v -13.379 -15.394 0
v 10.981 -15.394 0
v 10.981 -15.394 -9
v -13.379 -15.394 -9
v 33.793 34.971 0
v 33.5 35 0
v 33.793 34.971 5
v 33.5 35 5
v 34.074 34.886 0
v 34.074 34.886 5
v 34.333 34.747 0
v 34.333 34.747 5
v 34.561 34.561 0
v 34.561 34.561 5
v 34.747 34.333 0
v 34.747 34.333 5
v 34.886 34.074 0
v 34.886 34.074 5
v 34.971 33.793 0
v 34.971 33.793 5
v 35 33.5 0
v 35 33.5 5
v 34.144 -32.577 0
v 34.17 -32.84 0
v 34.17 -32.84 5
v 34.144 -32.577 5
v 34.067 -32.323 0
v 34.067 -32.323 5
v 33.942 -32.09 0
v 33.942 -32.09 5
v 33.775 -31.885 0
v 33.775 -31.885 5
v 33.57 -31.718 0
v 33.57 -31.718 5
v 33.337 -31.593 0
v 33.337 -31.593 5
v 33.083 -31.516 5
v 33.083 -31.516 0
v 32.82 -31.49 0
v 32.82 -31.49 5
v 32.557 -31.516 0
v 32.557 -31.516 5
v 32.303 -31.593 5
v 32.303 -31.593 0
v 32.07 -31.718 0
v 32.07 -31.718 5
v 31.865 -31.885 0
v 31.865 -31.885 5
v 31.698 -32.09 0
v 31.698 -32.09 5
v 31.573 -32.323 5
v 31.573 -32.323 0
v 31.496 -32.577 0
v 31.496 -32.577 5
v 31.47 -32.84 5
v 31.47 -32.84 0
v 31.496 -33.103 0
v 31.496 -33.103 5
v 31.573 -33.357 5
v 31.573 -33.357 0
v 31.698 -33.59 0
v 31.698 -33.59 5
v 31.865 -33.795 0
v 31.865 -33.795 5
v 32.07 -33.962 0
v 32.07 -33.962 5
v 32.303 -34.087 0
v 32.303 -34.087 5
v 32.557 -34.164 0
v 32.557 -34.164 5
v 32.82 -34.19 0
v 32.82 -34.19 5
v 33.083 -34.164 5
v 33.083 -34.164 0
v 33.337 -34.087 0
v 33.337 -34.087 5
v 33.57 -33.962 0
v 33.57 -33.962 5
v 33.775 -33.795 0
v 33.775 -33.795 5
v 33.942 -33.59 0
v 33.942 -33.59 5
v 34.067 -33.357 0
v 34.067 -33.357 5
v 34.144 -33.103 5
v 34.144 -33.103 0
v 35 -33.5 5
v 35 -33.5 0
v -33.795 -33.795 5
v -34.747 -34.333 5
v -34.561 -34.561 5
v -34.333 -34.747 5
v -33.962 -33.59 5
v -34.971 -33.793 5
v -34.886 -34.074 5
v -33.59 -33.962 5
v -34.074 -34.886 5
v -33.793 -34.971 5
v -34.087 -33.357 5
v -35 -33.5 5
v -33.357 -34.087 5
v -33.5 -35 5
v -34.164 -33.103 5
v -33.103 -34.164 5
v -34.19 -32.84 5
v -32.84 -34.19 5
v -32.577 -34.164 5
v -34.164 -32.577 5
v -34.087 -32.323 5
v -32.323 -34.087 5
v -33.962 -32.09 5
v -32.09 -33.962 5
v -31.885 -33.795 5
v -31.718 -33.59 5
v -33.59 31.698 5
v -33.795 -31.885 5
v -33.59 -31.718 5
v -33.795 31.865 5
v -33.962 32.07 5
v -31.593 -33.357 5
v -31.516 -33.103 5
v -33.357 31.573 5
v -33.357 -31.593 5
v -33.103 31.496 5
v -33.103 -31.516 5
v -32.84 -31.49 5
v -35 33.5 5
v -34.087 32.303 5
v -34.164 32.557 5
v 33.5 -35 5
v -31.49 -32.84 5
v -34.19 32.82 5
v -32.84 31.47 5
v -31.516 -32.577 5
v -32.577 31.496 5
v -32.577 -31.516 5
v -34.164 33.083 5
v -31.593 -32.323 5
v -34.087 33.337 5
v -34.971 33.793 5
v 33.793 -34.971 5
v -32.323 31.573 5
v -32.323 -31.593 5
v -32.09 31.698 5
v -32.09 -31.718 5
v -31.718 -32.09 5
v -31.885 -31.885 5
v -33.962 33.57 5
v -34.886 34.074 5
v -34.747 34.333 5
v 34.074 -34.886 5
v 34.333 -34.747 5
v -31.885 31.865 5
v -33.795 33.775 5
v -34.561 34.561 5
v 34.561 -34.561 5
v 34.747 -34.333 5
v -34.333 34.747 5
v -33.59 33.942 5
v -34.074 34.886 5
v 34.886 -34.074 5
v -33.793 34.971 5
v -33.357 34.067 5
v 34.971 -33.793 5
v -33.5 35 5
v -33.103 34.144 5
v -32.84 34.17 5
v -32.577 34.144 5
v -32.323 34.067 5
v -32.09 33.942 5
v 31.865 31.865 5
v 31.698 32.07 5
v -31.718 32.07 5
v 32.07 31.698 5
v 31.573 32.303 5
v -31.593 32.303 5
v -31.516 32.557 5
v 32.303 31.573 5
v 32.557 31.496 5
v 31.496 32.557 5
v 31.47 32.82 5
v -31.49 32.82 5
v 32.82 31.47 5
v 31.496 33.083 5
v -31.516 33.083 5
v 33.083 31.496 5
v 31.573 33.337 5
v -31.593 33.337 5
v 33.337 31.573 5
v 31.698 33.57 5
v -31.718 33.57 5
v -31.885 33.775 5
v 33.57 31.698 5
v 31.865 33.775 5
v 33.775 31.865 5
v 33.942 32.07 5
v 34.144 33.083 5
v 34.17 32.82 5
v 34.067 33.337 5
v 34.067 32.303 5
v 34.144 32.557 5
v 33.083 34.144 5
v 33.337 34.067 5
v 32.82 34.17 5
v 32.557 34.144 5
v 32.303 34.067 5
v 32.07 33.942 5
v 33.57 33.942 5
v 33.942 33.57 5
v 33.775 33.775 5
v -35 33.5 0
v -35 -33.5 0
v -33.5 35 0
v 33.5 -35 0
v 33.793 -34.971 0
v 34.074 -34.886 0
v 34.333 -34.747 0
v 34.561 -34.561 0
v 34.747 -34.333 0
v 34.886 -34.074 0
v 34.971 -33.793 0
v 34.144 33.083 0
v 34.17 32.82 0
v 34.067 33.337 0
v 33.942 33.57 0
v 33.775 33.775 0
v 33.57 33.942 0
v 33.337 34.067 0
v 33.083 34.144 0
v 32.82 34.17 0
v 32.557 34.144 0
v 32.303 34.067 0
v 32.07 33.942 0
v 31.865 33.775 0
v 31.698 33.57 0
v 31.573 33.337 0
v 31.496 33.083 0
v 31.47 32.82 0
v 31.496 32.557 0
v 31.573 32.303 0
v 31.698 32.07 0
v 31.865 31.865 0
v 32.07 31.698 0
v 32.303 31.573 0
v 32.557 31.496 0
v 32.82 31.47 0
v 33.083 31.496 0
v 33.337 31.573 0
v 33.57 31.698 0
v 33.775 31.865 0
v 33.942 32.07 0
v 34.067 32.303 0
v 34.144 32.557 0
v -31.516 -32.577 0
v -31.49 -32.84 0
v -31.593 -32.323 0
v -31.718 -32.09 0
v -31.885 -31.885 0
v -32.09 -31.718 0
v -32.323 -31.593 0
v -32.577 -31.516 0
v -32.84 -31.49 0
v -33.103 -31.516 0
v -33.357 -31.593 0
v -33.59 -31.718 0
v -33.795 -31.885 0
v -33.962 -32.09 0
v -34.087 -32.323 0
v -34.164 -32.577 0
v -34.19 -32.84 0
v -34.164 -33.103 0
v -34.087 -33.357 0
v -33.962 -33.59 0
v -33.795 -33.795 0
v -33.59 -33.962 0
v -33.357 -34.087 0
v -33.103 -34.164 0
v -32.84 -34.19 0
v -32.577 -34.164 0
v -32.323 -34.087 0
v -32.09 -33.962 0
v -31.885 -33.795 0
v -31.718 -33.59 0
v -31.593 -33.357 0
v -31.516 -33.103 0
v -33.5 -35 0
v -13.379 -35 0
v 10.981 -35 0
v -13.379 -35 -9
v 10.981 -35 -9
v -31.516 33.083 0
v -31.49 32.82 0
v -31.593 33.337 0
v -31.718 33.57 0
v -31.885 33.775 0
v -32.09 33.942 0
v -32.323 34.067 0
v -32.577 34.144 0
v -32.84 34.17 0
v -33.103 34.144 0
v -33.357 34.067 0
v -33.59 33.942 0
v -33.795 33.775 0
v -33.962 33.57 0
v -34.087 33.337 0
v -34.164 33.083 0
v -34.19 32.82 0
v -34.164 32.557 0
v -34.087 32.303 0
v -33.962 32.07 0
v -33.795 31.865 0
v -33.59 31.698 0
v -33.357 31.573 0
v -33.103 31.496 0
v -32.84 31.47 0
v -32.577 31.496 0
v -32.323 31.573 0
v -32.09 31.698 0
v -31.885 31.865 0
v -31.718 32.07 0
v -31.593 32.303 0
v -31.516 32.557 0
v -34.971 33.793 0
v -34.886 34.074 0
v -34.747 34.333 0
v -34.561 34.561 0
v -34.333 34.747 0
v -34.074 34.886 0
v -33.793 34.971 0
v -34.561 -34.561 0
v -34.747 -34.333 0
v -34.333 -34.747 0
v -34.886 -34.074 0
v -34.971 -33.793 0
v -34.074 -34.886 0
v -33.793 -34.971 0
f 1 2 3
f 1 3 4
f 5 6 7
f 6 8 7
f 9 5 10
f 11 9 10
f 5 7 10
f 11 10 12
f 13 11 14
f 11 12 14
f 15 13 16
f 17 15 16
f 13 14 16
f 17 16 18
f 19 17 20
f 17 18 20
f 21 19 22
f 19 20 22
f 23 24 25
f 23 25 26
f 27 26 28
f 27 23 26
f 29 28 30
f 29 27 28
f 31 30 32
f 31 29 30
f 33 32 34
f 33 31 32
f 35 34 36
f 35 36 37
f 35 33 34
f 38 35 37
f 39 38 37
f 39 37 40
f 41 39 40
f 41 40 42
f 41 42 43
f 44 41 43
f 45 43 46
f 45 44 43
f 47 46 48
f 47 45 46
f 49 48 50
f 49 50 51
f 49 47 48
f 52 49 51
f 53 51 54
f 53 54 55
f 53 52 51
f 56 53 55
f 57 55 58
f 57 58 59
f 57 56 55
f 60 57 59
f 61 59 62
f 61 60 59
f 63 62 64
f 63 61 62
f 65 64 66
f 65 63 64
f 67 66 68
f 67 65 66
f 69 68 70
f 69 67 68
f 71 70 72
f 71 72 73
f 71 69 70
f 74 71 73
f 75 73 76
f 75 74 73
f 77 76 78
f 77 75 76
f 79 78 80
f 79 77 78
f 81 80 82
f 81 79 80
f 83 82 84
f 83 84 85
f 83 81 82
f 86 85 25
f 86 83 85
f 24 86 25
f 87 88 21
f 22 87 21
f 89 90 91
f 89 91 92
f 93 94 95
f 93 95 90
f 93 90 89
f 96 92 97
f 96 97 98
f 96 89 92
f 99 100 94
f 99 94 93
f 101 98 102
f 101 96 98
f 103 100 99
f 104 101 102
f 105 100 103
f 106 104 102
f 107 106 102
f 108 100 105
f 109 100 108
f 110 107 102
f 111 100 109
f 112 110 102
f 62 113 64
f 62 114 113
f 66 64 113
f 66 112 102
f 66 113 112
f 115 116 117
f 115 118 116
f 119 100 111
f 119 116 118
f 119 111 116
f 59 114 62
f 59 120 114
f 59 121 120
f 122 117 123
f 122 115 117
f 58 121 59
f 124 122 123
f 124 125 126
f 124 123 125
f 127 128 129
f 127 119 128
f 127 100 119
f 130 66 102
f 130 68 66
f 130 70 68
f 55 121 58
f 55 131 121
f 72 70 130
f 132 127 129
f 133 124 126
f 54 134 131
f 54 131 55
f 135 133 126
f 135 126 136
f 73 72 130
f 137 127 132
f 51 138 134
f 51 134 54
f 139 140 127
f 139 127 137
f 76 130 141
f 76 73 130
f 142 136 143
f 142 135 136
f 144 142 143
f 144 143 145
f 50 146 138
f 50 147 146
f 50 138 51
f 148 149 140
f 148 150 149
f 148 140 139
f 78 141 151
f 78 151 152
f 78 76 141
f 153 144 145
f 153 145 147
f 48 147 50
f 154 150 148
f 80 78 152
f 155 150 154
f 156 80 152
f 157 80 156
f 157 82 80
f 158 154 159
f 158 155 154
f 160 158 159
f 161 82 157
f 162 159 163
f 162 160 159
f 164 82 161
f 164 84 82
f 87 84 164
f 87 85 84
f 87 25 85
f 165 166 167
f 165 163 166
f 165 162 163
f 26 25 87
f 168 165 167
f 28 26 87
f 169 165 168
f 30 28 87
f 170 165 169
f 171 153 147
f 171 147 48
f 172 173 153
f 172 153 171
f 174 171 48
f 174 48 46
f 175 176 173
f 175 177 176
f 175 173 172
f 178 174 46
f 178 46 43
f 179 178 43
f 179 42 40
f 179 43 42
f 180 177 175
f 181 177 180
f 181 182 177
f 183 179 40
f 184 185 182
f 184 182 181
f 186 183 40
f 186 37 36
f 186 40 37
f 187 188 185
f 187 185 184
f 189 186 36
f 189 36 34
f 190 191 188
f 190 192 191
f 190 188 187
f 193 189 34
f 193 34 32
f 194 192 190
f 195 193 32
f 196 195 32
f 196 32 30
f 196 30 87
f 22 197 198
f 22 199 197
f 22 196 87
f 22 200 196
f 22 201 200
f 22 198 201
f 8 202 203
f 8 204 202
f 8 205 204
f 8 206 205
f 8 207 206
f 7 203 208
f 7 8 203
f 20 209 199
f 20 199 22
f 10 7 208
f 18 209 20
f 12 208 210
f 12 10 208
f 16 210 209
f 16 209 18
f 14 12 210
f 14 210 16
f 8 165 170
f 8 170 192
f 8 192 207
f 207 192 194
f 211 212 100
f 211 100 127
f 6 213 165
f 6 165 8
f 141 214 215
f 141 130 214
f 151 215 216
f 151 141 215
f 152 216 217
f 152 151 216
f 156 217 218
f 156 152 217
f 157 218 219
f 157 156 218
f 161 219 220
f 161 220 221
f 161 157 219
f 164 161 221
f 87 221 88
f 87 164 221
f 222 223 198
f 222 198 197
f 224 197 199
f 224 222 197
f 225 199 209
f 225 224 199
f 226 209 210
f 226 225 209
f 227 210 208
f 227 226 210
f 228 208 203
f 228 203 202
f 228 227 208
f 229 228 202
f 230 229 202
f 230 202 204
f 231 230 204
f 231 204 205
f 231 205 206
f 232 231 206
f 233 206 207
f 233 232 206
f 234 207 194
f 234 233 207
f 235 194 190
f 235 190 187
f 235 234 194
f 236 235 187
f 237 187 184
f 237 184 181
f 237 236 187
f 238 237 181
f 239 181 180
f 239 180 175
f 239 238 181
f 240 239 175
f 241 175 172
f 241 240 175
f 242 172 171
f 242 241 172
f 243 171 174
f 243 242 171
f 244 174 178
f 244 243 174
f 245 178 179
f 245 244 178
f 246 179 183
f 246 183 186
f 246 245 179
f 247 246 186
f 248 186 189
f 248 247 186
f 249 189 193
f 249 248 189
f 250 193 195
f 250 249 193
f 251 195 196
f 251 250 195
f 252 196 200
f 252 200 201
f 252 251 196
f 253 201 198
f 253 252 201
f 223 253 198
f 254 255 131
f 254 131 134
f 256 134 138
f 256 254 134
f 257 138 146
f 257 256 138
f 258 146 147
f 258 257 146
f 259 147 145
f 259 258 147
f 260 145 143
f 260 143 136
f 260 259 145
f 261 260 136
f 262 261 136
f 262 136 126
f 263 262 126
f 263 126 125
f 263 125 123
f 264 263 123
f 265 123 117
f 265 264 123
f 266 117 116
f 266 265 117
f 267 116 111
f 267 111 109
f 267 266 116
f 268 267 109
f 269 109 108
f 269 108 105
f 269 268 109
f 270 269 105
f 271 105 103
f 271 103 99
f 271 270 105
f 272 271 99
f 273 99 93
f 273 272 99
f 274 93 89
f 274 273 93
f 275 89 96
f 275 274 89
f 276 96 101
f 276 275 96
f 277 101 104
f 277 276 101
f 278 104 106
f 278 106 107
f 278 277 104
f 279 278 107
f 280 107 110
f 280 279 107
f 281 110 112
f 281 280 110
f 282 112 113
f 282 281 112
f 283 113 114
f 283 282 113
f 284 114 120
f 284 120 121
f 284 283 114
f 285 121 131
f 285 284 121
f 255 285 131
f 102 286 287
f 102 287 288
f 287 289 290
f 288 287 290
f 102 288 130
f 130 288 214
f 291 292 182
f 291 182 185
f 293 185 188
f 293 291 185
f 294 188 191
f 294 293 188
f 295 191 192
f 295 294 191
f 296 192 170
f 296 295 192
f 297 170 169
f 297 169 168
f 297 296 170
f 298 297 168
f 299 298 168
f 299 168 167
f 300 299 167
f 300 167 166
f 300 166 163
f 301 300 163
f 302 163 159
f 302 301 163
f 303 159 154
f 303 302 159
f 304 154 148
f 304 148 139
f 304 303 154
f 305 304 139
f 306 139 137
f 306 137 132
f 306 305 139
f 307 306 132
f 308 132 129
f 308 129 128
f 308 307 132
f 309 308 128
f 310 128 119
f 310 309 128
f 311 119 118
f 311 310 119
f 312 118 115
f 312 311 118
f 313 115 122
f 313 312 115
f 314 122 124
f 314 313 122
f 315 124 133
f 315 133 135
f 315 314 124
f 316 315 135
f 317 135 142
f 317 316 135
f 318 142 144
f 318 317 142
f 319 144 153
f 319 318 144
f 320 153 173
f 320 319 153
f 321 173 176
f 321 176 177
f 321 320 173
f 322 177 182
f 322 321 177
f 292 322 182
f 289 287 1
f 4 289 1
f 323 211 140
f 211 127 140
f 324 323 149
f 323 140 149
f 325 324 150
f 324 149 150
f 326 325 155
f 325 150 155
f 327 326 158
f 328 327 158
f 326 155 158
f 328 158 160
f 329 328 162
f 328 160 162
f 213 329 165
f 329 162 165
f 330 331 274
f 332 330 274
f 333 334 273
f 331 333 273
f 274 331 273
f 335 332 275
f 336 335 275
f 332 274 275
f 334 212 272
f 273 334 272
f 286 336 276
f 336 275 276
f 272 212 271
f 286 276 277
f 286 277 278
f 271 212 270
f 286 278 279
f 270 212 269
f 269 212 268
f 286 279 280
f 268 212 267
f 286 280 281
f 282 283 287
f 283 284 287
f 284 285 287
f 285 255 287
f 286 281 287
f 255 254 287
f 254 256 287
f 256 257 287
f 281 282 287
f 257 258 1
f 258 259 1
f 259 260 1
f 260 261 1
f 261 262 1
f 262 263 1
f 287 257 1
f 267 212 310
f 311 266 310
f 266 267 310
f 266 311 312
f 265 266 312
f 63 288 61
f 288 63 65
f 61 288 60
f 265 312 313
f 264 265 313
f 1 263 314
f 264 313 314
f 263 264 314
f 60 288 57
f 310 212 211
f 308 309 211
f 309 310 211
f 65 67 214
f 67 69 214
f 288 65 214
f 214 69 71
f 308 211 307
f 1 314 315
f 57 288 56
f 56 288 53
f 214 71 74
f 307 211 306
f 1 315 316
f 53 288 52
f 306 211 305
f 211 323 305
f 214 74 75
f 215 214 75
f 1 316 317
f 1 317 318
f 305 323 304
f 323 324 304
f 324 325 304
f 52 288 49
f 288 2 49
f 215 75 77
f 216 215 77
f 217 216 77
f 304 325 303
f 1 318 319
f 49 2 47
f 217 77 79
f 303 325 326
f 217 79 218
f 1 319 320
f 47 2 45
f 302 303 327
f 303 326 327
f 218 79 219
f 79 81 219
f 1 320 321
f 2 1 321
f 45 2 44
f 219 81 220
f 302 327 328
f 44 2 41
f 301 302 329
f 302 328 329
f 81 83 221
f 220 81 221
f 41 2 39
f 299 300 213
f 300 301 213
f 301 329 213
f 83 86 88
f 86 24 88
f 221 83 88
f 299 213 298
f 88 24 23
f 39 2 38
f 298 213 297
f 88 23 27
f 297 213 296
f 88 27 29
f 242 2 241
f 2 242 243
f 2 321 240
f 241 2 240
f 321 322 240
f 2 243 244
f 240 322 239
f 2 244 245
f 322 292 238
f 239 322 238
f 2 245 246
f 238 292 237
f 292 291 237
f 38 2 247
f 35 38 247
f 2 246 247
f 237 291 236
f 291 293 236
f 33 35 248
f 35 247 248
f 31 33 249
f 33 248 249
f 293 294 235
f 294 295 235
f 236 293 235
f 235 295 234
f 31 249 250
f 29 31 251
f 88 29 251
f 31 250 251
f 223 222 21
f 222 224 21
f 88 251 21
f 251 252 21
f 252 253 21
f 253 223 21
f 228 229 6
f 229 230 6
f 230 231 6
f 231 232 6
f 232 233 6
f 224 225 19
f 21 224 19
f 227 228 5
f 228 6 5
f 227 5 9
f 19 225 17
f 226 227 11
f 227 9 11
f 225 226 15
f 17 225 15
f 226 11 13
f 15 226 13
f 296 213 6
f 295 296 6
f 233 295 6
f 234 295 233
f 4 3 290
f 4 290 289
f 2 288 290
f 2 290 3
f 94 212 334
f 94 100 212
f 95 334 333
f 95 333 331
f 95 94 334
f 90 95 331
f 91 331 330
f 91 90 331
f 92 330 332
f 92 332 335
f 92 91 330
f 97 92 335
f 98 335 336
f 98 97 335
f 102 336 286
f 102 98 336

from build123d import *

# Parameters (mm, degrees)
SKETCH1_W           = 70
SKETCH1_H           = 70
SKETCH1_R           = 1.35
BOSS_EXTRUDE1_DEPTH = 5
FILLET1_R           = 1.5
SKETCH2_W           = 24.359680225
SKETCH2_H           = 19.606300568
BOSS_EXTRUDE2_DEPTH = 9


with BuildPart() as part:
    # Sketch1 → Boss-Extrude1 (new body)
    with BuildSketch(Plane.XY):
        Rectangle(SKETCH1_W, SKETCH1_H)
        with Locations((-32.84, 32.82)):
            Circle(SKETCH1_R, mode=Mode.SUBTRACT)
        with Locations((-32.84, -32.84)):
            Circle(SKETCH1_R, mode=Mode.SUBTRACT)
        with Locations((32.82, -32.84)):
            Circle(SKETCH1_R, mode=Mode.SUBTRACT)
        with Locations((32.82, 32.82)):
            Circle(SKETCH1_R, mode=Mode.SUBTRACT)
    extrude(amount=BOSS_EXTRUDE1_DEPTH)

    # Fillet1
    fillet1_edges = [part.edges().sort_by_distance(p)[0] for p in [
        (35, -35, 2.5),
        (-35, -35, 2.5),
        (-35, 35, 2.5),
        (35, 35, 2.5),
    ]]
    fillet(fillet1_edges, radius=FILLET1_R)

    # Sketch2 → Boss-Extrude2 (add)
    with BuildSketch(Plane(origin=(0, 0, 0), x_dir=(-1, 0, 0), z_dir=(0, 0, -1))):
        with Locations((1.199225338, -25.196849716)):
            Rectangle(SKETCH2_W, SKETCH2_H)
    extrude(amount=BOSS_EXTRUDE2_DEPTH)


solid = part.part
